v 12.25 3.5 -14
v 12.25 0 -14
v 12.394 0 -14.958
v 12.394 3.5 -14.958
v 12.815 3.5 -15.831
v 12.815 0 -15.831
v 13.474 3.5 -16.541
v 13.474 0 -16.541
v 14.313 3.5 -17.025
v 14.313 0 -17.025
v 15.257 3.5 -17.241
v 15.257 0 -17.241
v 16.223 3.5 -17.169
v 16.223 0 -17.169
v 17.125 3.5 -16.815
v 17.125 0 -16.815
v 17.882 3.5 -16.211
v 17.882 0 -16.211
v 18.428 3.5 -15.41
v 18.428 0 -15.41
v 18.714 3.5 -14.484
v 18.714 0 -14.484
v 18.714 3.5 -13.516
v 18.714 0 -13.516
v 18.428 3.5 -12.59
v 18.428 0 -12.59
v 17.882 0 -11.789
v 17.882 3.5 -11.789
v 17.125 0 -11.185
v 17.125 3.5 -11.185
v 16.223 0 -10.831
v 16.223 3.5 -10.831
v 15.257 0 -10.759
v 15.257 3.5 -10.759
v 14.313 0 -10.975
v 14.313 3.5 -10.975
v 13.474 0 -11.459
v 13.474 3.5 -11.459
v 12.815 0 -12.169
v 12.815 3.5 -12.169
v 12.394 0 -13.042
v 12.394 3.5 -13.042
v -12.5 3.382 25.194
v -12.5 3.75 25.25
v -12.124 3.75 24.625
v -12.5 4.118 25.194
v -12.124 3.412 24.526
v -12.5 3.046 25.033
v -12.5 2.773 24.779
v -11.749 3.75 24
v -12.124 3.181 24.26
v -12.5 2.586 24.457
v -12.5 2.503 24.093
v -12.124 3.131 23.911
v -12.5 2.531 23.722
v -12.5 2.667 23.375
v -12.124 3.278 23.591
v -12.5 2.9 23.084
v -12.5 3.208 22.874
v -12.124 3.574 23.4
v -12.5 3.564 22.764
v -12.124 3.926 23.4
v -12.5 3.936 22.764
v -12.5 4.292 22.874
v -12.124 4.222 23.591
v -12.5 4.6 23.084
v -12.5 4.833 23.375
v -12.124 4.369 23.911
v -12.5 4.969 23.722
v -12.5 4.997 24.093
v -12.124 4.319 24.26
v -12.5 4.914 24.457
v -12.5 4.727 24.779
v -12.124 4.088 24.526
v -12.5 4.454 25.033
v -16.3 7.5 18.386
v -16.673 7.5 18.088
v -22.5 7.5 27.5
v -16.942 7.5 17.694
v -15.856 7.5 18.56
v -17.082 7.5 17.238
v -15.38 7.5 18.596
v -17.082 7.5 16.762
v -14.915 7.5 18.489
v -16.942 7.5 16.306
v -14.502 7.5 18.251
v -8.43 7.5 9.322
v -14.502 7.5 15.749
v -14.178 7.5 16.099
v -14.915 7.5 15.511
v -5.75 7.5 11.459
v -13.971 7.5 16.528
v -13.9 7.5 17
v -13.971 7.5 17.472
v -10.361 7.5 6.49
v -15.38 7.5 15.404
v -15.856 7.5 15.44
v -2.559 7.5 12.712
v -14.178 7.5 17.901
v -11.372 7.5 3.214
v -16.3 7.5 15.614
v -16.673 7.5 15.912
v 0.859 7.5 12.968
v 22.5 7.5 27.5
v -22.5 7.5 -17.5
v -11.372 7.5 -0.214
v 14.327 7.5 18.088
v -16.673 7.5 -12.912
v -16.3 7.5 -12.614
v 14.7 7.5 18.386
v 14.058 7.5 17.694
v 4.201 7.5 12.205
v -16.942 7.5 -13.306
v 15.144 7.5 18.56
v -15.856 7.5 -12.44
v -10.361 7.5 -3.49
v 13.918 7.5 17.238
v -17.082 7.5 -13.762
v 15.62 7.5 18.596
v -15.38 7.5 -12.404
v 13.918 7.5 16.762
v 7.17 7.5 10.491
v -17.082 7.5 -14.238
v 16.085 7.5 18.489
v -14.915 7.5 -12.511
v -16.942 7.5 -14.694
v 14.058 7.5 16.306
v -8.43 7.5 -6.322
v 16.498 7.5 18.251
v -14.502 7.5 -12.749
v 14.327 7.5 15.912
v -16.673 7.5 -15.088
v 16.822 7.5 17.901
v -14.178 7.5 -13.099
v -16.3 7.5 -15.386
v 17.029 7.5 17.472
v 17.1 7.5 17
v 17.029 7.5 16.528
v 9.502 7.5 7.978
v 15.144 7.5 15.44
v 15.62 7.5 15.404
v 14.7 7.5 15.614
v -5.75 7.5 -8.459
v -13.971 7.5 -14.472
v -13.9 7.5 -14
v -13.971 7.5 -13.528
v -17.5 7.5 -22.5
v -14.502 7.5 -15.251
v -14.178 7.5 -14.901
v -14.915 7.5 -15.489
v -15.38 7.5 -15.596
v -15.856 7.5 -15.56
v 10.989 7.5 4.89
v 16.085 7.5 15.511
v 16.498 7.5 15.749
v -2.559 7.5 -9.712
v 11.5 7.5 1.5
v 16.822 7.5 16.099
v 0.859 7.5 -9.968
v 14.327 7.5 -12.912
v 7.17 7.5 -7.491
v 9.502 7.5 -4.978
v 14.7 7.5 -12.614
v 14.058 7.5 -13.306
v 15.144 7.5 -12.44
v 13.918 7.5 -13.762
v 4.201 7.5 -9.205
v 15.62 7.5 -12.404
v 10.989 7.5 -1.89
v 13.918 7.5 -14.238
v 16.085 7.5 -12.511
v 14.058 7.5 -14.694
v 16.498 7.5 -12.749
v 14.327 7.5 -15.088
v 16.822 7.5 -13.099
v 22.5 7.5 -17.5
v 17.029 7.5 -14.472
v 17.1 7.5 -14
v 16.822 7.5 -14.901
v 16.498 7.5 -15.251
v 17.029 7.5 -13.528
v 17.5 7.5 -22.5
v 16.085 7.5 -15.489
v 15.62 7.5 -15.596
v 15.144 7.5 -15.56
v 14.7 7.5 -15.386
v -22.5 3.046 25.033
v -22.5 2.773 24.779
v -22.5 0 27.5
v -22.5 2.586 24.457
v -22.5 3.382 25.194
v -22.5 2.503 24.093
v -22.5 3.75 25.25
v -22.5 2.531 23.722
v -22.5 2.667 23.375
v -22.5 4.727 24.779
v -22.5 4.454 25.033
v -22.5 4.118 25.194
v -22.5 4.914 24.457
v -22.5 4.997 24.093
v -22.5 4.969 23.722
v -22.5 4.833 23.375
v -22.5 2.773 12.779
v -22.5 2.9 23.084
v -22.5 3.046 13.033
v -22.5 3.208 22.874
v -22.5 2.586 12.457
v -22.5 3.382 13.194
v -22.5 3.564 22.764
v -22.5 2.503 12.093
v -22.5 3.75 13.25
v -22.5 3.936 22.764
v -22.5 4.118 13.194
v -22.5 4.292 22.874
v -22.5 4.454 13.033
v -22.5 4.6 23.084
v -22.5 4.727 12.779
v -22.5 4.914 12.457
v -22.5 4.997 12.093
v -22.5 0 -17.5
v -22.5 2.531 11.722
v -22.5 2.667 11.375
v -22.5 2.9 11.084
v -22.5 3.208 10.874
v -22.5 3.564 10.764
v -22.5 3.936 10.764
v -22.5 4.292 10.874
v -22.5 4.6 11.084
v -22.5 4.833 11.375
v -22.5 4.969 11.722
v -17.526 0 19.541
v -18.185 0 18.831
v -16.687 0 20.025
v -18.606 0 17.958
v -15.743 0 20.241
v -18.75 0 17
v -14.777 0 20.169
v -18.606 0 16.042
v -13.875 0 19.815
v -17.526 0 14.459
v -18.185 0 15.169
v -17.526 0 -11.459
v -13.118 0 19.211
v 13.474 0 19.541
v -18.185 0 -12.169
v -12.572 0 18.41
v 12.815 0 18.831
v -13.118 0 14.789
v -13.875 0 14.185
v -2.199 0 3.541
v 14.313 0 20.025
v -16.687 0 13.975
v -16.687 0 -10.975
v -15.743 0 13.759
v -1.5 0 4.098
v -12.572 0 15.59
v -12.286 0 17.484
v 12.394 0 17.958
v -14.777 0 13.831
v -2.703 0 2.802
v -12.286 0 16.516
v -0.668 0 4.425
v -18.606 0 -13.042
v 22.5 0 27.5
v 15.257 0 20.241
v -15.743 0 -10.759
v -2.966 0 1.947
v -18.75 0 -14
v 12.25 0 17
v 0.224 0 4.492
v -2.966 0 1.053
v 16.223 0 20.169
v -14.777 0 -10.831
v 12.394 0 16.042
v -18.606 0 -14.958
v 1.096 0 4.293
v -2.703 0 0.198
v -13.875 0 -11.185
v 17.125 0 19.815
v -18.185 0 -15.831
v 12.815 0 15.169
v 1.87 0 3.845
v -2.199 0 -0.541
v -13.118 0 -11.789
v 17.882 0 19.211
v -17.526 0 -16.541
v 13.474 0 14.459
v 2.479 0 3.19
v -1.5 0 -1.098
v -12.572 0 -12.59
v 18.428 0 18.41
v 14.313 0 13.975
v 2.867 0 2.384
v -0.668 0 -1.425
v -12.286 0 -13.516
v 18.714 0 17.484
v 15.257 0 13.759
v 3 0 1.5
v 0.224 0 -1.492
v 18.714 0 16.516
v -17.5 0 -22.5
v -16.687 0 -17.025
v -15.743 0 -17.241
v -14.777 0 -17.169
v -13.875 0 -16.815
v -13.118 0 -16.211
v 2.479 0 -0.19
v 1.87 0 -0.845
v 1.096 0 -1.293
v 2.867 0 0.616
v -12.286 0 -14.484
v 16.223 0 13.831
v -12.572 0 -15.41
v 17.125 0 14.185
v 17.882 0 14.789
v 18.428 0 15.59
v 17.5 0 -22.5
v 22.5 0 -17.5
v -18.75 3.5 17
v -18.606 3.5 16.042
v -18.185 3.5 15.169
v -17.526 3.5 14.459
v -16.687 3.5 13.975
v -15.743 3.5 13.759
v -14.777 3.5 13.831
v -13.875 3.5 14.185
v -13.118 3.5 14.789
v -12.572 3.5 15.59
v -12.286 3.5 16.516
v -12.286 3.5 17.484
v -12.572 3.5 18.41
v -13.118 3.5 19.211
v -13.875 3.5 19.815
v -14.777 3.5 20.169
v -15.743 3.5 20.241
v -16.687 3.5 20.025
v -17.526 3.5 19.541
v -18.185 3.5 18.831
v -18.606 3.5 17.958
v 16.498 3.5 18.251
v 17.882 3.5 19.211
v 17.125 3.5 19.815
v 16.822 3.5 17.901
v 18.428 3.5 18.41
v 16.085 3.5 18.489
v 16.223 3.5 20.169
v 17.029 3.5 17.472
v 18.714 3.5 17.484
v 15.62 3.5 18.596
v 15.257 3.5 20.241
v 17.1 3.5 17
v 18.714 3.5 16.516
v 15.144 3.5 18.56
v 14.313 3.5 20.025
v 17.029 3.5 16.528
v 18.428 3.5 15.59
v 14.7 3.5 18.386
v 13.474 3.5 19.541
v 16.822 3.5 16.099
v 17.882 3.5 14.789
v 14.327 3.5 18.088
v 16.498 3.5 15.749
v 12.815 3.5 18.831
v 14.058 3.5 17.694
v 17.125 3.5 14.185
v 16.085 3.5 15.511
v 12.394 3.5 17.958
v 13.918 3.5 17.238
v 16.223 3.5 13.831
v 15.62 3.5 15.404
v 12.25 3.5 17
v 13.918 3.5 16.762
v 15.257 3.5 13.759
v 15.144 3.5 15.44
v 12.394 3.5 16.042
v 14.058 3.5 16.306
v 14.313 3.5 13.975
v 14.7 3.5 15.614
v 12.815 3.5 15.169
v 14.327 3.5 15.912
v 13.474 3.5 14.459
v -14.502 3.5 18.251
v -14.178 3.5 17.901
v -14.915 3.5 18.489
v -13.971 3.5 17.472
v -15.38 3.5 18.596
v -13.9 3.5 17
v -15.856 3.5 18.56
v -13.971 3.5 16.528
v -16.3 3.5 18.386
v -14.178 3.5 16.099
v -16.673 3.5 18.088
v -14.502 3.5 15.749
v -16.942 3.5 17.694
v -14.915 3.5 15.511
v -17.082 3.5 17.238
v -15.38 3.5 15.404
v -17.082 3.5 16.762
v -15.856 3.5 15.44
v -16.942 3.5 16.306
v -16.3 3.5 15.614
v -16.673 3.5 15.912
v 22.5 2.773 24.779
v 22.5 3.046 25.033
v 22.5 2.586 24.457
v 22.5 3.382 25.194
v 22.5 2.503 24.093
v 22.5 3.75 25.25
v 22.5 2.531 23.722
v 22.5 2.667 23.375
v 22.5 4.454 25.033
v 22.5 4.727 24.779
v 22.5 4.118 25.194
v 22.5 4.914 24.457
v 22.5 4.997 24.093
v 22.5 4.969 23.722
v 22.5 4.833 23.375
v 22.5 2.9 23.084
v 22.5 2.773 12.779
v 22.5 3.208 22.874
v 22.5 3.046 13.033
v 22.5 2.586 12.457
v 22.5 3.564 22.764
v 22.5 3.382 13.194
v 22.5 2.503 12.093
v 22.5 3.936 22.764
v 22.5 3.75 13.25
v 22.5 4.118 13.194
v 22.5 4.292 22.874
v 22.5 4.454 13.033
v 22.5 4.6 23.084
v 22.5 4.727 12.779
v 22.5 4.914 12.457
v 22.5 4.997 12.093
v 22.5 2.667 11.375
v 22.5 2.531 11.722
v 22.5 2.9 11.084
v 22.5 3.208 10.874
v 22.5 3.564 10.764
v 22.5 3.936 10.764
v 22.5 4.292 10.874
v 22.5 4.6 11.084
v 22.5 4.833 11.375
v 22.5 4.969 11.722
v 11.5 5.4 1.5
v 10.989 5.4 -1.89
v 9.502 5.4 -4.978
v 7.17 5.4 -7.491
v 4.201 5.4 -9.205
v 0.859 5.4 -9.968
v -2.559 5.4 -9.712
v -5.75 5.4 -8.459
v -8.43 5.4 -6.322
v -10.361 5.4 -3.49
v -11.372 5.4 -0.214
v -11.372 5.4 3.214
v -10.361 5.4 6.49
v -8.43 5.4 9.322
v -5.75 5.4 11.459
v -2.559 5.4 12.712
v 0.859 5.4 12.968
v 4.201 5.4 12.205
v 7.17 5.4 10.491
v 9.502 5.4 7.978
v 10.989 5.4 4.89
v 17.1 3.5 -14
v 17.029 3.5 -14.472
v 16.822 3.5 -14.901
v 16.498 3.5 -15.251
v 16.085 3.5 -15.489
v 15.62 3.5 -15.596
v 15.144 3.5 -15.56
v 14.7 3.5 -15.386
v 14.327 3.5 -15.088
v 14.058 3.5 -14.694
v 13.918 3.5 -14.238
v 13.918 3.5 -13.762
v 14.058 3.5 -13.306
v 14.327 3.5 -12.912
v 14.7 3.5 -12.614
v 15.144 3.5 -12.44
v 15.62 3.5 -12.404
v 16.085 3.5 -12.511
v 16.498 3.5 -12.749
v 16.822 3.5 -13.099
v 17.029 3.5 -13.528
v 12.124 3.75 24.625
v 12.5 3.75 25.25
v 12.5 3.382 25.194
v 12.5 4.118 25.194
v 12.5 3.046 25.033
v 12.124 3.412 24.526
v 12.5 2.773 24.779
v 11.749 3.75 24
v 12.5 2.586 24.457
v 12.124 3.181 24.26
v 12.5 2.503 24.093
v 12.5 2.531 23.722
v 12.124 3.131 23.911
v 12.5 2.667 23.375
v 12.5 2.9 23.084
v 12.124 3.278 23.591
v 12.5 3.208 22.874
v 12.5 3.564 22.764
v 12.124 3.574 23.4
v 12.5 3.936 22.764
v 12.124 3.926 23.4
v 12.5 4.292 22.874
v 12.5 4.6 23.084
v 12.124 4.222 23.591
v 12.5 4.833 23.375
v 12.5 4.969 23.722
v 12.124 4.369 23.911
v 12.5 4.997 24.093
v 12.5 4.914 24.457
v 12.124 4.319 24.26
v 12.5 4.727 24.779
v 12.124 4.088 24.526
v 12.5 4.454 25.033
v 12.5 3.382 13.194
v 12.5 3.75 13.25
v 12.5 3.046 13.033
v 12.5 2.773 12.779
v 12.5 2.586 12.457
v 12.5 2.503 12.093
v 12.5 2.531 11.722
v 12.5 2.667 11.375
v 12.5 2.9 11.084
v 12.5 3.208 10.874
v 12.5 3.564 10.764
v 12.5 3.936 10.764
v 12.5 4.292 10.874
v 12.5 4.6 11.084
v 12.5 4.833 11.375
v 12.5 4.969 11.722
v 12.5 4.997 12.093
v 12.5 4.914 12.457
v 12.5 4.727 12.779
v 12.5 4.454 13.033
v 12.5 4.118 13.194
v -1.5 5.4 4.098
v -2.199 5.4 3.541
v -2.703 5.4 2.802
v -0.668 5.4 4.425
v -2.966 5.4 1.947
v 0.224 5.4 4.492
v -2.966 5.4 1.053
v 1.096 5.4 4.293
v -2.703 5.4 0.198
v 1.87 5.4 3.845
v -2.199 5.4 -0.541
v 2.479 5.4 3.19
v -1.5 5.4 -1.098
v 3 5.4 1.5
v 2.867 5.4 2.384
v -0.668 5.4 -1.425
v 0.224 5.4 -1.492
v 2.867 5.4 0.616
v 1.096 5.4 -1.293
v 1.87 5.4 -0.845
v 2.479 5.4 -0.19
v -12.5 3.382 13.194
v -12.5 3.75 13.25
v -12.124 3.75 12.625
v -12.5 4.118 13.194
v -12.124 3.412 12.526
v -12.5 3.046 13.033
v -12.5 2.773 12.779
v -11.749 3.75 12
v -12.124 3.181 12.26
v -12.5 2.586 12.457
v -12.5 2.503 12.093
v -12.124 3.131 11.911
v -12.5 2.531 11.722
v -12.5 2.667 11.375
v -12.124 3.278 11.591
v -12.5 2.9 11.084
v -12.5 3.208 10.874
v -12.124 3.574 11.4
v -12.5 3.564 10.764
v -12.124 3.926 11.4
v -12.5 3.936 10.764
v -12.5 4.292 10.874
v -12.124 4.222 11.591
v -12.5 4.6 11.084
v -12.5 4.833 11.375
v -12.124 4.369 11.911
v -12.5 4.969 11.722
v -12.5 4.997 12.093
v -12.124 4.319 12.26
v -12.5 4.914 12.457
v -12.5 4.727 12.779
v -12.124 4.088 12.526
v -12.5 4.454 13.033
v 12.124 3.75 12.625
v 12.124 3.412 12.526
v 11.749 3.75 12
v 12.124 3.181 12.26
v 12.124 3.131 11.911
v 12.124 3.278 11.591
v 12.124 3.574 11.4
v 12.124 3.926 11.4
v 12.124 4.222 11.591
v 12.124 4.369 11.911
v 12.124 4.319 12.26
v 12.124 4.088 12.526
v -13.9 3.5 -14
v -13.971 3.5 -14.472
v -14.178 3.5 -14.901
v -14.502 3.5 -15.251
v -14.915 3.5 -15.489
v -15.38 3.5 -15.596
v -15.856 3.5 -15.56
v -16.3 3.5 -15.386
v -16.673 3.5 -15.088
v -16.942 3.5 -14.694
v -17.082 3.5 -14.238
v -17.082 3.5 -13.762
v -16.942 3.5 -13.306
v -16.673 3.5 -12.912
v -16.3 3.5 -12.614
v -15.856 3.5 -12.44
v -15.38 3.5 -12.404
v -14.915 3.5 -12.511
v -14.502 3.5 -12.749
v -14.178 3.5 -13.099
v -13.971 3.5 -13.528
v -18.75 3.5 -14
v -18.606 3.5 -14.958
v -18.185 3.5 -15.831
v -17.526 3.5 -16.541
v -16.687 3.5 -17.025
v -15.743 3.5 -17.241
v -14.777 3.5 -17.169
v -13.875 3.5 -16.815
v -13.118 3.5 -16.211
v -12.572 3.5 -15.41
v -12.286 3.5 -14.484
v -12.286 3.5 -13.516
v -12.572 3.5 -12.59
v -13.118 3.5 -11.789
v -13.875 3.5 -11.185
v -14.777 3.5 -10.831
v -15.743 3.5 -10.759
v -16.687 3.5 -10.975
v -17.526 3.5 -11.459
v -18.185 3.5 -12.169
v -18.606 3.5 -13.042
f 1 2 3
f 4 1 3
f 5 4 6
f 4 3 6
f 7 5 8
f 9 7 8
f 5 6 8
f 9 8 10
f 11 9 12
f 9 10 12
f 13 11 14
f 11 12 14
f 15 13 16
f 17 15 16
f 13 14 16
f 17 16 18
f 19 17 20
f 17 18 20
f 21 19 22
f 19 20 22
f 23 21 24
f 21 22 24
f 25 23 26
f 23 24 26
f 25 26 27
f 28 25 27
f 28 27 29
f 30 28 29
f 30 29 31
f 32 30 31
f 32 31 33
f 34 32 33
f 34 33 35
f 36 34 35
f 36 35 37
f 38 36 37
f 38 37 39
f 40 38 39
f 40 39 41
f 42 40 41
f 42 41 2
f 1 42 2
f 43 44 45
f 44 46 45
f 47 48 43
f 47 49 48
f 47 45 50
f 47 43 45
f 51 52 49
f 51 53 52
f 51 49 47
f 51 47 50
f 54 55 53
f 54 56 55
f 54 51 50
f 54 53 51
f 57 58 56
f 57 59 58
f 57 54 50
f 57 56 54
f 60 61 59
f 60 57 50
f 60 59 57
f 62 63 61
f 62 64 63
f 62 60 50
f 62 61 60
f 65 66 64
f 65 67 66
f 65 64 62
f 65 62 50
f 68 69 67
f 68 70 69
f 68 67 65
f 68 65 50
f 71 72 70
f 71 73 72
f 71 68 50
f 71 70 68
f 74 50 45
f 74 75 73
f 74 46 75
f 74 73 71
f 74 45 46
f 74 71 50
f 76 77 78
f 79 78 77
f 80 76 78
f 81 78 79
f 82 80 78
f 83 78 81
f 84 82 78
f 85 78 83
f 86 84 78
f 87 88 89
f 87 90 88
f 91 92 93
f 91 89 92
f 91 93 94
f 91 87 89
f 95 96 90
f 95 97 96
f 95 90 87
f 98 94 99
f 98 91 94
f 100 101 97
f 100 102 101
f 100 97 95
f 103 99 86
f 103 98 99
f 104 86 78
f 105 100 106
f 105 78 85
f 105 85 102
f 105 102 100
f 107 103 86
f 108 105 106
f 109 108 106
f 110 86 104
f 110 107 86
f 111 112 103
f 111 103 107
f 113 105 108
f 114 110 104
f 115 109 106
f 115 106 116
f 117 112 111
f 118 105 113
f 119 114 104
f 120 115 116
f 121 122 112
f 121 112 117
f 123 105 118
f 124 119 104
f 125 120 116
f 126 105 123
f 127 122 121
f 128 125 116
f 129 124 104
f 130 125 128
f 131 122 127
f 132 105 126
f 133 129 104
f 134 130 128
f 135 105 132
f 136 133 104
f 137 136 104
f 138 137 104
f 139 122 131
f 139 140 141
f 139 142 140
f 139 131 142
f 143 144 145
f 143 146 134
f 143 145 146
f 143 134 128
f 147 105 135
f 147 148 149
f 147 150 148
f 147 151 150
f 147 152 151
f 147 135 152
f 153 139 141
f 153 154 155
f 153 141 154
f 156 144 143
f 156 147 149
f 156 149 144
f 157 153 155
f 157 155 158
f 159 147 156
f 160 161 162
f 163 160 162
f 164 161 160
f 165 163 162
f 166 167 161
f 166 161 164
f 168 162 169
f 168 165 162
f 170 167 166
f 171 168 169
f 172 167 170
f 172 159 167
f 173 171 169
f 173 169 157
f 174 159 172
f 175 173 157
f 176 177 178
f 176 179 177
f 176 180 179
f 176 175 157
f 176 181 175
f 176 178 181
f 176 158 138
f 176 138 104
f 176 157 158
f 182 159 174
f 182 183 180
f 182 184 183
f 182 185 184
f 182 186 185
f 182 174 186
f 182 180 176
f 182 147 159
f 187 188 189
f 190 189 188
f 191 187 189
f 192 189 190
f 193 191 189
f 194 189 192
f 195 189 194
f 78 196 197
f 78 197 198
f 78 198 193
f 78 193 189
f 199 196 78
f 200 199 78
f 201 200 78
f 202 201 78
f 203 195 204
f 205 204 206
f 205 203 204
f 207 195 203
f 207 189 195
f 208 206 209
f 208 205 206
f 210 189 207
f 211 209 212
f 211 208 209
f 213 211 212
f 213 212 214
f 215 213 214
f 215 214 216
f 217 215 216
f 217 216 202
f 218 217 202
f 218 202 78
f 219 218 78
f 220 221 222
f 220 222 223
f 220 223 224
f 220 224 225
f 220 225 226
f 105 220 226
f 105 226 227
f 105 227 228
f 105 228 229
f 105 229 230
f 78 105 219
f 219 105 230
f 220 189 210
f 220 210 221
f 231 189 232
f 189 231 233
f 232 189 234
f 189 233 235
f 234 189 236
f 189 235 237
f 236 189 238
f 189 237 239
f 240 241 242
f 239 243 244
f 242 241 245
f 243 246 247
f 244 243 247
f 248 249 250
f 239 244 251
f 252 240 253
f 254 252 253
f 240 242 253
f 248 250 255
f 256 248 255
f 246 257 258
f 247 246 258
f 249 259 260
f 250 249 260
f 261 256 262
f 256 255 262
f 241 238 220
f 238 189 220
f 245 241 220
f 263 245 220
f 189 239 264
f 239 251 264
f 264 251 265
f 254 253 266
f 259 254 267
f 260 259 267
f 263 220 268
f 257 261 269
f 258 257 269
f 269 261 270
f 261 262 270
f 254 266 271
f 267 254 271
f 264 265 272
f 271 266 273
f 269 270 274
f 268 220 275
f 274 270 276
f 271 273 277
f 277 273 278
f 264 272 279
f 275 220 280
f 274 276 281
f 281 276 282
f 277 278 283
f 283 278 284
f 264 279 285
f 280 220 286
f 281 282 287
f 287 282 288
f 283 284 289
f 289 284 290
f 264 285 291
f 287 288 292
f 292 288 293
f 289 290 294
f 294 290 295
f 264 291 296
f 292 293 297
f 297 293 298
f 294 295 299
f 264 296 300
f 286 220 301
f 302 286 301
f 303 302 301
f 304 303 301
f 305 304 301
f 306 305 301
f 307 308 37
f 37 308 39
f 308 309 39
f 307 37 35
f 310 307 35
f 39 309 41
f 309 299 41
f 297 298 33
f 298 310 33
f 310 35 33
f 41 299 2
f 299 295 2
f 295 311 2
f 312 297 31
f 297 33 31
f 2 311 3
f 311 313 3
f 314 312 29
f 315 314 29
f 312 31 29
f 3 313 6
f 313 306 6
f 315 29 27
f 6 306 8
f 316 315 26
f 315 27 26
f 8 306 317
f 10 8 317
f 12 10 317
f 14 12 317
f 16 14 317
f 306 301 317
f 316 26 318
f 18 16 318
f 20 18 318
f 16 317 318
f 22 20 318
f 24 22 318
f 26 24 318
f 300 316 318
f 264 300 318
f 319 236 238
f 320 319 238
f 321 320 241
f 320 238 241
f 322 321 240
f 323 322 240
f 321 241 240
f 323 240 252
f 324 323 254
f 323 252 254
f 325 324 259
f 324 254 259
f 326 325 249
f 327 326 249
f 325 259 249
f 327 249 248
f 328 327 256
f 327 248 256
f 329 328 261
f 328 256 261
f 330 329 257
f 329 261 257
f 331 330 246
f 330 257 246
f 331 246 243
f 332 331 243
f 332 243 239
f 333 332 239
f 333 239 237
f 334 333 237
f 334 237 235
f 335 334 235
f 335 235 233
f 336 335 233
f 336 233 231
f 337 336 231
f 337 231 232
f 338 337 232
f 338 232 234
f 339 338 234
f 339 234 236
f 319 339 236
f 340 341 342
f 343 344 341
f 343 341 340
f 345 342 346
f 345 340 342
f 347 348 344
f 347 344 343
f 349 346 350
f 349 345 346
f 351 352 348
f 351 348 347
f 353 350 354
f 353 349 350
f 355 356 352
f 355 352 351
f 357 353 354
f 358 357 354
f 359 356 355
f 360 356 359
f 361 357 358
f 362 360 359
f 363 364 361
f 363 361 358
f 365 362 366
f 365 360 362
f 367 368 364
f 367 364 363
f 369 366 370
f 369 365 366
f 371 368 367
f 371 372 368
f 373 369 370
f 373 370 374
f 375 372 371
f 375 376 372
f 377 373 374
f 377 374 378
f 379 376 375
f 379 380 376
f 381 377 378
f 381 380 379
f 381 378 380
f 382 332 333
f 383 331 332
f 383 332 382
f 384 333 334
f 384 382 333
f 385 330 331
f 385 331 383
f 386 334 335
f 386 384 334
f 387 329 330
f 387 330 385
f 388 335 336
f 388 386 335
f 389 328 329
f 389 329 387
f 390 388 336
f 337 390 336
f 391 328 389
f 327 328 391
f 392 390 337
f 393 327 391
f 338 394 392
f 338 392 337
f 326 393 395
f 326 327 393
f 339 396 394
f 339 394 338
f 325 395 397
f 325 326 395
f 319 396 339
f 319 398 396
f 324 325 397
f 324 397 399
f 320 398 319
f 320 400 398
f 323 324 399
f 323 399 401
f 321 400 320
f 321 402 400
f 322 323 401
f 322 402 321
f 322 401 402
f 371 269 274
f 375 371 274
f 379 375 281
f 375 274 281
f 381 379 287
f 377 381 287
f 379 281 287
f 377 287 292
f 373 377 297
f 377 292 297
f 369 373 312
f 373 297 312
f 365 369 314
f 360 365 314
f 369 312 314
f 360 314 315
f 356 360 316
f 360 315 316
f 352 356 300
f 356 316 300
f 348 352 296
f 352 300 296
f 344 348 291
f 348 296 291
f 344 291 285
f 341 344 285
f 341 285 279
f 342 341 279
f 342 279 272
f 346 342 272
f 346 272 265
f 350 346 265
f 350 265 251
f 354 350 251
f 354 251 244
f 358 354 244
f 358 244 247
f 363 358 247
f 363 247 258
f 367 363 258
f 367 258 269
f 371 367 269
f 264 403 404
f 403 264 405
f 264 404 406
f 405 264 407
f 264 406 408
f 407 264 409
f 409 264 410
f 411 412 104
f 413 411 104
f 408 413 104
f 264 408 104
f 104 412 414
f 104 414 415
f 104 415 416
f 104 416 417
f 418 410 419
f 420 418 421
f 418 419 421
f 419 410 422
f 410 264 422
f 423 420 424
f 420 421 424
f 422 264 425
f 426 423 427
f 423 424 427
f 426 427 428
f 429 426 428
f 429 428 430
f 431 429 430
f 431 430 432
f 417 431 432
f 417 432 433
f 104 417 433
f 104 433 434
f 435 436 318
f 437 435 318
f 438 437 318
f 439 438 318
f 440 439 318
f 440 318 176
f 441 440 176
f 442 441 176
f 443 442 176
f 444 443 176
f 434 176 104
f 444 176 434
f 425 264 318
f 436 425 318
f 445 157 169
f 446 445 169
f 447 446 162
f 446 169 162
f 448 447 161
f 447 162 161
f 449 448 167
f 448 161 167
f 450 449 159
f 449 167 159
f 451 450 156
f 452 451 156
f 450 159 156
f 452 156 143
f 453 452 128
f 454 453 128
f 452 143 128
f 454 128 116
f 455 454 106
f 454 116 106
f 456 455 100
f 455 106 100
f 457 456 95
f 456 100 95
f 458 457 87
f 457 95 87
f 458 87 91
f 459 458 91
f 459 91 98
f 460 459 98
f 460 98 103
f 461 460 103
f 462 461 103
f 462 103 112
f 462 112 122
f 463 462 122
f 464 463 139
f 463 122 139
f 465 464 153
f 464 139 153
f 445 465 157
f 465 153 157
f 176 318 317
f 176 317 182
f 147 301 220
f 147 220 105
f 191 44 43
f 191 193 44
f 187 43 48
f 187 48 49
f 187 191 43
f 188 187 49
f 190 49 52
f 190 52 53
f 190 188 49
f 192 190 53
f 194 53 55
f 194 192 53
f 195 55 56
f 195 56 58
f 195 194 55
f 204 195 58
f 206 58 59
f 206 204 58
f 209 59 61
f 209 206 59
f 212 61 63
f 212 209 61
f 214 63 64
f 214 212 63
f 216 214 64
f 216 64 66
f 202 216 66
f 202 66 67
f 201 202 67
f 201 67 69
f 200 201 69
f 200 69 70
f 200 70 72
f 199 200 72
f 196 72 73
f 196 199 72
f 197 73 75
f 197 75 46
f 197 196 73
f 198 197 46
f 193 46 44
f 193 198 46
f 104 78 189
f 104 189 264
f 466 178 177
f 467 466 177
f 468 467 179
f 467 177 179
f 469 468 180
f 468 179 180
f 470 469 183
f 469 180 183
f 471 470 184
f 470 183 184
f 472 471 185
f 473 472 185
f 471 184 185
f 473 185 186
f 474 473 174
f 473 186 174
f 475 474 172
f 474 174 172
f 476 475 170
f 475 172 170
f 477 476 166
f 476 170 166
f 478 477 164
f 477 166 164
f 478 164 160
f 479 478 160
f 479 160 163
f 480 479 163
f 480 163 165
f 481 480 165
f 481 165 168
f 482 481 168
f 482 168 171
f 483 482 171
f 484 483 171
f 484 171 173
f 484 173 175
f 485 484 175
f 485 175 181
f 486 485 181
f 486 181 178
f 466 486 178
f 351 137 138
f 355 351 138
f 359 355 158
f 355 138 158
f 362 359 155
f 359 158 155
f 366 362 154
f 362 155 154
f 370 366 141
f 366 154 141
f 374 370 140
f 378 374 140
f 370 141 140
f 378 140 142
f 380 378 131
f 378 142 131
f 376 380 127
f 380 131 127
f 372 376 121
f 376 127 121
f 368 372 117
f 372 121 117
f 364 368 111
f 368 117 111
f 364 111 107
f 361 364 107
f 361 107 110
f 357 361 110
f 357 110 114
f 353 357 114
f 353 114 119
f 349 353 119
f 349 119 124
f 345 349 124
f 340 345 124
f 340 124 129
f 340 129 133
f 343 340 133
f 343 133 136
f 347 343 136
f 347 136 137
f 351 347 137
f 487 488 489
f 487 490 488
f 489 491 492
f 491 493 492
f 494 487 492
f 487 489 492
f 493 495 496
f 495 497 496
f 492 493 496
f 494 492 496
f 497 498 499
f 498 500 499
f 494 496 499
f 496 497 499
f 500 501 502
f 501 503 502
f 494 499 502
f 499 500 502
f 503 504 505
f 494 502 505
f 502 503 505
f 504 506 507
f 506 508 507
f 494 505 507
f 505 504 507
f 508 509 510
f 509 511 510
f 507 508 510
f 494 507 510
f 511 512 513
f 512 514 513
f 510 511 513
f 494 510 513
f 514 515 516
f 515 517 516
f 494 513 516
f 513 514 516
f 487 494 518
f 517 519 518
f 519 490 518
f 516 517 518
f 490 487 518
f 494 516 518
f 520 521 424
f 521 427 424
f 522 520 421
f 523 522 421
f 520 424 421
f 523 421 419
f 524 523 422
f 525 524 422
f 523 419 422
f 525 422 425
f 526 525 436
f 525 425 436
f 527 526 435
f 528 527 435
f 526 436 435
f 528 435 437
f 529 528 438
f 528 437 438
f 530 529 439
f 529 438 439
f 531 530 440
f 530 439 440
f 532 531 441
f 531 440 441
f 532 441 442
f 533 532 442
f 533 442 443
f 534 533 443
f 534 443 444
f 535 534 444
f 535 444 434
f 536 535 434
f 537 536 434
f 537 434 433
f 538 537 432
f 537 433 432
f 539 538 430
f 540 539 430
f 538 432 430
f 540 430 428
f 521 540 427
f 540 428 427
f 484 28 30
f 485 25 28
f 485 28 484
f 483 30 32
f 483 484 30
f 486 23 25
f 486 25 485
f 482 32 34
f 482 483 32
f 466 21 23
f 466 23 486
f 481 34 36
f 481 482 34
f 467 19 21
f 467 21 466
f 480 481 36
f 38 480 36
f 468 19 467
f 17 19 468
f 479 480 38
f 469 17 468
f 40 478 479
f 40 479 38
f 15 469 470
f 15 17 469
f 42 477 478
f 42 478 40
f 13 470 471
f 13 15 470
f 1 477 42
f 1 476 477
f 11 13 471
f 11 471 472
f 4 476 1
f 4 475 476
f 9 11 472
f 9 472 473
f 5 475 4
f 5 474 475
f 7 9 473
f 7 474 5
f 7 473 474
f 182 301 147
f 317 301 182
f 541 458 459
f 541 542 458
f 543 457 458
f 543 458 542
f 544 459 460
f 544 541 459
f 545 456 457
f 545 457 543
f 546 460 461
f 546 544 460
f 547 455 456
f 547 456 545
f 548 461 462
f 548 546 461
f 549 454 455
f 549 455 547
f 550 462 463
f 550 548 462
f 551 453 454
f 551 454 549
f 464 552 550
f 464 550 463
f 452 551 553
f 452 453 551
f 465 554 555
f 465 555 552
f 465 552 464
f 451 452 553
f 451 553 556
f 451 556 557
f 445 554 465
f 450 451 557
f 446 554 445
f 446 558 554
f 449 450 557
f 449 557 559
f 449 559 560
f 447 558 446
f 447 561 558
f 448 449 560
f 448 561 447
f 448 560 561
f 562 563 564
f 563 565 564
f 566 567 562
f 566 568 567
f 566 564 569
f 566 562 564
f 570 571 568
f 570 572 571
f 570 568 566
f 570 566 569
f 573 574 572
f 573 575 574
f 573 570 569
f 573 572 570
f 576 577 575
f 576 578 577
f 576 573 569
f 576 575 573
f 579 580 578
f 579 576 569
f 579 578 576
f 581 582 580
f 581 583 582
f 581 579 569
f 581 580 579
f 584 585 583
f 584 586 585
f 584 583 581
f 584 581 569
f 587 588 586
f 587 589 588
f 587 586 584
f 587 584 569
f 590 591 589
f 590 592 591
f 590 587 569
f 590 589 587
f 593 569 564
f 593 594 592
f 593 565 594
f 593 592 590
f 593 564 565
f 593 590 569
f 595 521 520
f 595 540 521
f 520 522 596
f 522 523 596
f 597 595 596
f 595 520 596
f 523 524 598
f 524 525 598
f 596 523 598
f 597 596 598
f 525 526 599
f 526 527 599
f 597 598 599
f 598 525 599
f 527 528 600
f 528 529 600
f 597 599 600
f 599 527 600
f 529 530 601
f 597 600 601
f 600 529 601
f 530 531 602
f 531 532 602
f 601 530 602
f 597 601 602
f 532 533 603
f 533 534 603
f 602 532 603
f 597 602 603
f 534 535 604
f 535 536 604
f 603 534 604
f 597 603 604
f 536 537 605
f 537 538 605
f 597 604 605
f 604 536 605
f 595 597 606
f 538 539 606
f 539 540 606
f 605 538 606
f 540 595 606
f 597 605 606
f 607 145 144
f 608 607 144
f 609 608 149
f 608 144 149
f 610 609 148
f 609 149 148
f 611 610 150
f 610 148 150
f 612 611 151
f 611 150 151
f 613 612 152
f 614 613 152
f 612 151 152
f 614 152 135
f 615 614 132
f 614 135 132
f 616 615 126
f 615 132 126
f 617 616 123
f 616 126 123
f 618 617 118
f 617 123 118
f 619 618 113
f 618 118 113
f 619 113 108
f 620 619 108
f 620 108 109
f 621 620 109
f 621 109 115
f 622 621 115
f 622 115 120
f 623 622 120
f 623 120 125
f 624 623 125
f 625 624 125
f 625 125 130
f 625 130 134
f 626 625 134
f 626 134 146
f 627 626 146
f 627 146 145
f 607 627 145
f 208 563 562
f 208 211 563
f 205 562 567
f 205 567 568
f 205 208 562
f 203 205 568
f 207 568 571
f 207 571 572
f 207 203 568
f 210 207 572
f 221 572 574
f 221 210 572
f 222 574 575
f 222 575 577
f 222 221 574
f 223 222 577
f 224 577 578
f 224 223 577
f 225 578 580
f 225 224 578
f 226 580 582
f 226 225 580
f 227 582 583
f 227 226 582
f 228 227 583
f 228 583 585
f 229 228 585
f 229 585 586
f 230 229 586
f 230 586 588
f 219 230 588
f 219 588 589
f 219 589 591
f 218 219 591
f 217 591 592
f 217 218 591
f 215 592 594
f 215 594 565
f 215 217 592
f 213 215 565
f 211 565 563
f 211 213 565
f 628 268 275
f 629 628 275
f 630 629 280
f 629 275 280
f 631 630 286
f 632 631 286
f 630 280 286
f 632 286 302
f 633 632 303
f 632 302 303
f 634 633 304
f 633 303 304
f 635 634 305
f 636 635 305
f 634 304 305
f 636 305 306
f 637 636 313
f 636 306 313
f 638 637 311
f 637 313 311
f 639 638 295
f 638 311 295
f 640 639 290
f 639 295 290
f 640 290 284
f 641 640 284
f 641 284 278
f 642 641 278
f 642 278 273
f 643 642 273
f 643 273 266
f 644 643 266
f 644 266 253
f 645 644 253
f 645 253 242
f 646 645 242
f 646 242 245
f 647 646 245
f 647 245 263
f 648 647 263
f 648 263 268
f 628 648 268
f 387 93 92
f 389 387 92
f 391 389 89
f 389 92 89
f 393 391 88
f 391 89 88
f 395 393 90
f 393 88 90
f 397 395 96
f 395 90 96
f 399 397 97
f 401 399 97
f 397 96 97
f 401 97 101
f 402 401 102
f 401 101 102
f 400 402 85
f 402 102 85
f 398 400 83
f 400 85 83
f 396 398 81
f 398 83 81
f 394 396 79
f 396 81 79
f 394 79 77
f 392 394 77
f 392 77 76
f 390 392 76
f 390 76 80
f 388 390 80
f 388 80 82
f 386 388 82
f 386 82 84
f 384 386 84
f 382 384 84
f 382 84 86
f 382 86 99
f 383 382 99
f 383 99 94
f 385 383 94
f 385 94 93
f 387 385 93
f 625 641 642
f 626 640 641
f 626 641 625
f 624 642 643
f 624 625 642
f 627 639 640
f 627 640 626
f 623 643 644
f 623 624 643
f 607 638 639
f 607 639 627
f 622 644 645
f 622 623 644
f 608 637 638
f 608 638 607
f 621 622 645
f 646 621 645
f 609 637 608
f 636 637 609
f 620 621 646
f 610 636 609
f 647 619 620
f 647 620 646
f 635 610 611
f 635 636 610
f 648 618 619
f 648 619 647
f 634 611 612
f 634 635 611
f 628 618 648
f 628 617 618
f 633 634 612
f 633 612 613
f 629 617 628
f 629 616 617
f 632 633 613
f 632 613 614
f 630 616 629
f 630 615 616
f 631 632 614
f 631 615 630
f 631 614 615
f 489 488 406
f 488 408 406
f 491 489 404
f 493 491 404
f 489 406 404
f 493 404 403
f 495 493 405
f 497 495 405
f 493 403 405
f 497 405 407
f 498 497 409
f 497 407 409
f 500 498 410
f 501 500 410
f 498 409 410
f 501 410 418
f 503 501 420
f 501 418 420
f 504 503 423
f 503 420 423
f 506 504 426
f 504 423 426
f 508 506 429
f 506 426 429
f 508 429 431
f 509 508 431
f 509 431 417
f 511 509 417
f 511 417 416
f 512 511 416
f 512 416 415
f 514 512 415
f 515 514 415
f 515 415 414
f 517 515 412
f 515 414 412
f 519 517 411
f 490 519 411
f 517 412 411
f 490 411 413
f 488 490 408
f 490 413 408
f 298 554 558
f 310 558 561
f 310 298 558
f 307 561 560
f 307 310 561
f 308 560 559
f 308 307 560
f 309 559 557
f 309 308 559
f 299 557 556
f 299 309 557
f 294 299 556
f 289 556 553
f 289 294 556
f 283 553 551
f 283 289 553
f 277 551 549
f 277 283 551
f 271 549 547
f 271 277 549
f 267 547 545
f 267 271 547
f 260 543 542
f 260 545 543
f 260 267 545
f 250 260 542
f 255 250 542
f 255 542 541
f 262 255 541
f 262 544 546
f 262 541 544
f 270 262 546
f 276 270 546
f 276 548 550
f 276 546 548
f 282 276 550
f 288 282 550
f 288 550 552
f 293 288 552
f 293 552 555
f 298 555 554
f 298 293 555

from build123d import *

# Parameters (mm, degrees)
SKETCH3_W                                           = 45
SKETCH3_H                                           = 45
SKETCH3_R                                           = 3
BOSS_EXTRUDE2_DEPTH                                 = 7.5
SKETCH5_R                                           = 11.5
CUT_EXTRUDE1_DEPTH                                  = 2.1
CHAMFER1_SIZE                                       = 5
CBORE_FOR_M3_HEX_SOCKET_HEAD_CAP_SCREW1_D           = 3.2
CBORE_FOR_M3_HEX_SOCKET_HEAD_CAP_SCREW1_DEPTH       = 7.5
CBORE_FOR_M3_HEX_SOCKET_HEAD_CAP_SCREW1_CBORE_D     = 6.5
CBORE_FOR_M3_HEX_SOCKET_HEAD_CAP_SCREW1_CBORE_DEPTH = 3.5
SKETCH10_W                                          = 45
SKETCH10_H                                          = 7.5
BOSS_EXTRUDE3_DEPTH                                 = 5
M3_TAPPED_HOLE2_AT_2_COUNT                          = 2
M3_TAPPED_HOLE2_AT_2_PITCH                          = 12


with BuildPart() as part:
    # Sketch3 → Boss-Extrude2 (new body)
    with BuildSketch(Plane(origin=(0, 0, 0), x_dir=(1, 0, 0), z_dir=(0, 1, 0))):
        Rectangle(SKETCH3_W, SKETCH3_H)
        with Locations((0, -1.5)):
            Circle(SKETCH3_R, mode=Mode.SUBTRACT)
    extrude(amount=BOSS_EXTRUDE2_DEPTH)

    # Sketch5 → Cut-Extrude1 (cut)
    with BuildSketch(Plane(origin=(0, 7.5, 0), x_dir=(1, 0, 0), z_dir=(0, 1, 0))):
        with Locations((0, -1.5)):
            Circle(SKETCH5_R)
    extrude(amount=-CUT_EXTRUDE1_DEPTH, mode=Mode.SUBTRACT)

    # Chamfer1
    chamfer1_edges = [part.edges().sort_by_distance(p)[0] for p in [
        (-22.5, 3.75, -22.5),
        (22.5, 3.75, -22.5),
    ]]
    chamfer(chamfer1_edges, length=CHAMFER1_SIZE)

    # CBORE for M3 Hex Socket Head Cap Screw1
    with Locations(Plane(origin=(0, 0, 0), x_dir=(-1, 0, 0), z_dir=(0, -1, 0))):
        with Locations((15.5, 14), (-15.5, -17), (-15.5, 14), (15.5, -17)):
            CounterBoreHole(CBORE_FOR_M3_HEX_SOCKET_HEAD_CAP_SCREW1_D / 2, CBORE_FOR_M3_HEX_SOCKET_HEAD_CAP_SCREW1_CBORE_D / 2, CBORE_FOR_M3_HEX_SOCKET_HEAD_CAP_SCREW1_CBORE_DEPTH, depth=CBORE_FOR_M3_HEX_SOCKET_HEAD_CAP_SCREW1_DEPTH)

    # Sketch10 → Boss-Extrude3 (add)
    with BuildSketch(Plane.XY.offset(22.5)):
        with Locations((0, 3.75)):
            Rectangle(SKETCH10_W, SKETCH10_H)
    extrude(amount=BOSS_EXTRUDE3_DEPTH)

    # Sketch14 → M3 Tapped Hole2 (revolve, cut)
    with BuildSketch(Plane(origin=(-22.5, 3.75, 24), x_dir=(0, 0, 1), z_dir=(0, 1, 0))):
        Polygon((0, 0), (0, 10.751075774), (1.25, 10), (1.25, 0), align=None)
    m3_tapped_hole2 = revolve(axis=Axis((-28.85, 3.75, 24), (1, 0, 0)), mode=Mode.SUBTRACT)

    # M3 Tapped Hole2 at 2: M3 Tapped Hole2 ×2
    with Locations(*[(0, 0, -i * M3_TAPPED_HOLE2_AT_2_PITCH) for i in range(1, M3_TAPPED_HOLE2_AT_2_COUNT)]):
        add(m3_tapped_hole2, mode=Mode.SUBTRACT)

    # Mirror1: M3 Tapped Hole2 across plane
    add(m3_tapped_hole2.mirror(Plane(origin=(0, 0, 0), x_dir=(0, 0, 1), z_dir=(1, 0, 0))), mode=Mode.SUBTRACT)

    # Mirror1 copy 1 sketch → Mirror1 copy 1 (revolve, cut)
    with BuildSketch(Plane(origin=(22.5, 3.75, 12), x_dir=(0, 0, 1), z_dir=(0, 1, 0))):
        Polygon((0, 0), (0, -10.751075774), (1.25, -10), (1.25, 0), align=None)
    revolve(axis=Axis((28.85, 3.75, 12), (1, 0, 0)), mode=Mode.SUBTRACT)


solid = part.part
